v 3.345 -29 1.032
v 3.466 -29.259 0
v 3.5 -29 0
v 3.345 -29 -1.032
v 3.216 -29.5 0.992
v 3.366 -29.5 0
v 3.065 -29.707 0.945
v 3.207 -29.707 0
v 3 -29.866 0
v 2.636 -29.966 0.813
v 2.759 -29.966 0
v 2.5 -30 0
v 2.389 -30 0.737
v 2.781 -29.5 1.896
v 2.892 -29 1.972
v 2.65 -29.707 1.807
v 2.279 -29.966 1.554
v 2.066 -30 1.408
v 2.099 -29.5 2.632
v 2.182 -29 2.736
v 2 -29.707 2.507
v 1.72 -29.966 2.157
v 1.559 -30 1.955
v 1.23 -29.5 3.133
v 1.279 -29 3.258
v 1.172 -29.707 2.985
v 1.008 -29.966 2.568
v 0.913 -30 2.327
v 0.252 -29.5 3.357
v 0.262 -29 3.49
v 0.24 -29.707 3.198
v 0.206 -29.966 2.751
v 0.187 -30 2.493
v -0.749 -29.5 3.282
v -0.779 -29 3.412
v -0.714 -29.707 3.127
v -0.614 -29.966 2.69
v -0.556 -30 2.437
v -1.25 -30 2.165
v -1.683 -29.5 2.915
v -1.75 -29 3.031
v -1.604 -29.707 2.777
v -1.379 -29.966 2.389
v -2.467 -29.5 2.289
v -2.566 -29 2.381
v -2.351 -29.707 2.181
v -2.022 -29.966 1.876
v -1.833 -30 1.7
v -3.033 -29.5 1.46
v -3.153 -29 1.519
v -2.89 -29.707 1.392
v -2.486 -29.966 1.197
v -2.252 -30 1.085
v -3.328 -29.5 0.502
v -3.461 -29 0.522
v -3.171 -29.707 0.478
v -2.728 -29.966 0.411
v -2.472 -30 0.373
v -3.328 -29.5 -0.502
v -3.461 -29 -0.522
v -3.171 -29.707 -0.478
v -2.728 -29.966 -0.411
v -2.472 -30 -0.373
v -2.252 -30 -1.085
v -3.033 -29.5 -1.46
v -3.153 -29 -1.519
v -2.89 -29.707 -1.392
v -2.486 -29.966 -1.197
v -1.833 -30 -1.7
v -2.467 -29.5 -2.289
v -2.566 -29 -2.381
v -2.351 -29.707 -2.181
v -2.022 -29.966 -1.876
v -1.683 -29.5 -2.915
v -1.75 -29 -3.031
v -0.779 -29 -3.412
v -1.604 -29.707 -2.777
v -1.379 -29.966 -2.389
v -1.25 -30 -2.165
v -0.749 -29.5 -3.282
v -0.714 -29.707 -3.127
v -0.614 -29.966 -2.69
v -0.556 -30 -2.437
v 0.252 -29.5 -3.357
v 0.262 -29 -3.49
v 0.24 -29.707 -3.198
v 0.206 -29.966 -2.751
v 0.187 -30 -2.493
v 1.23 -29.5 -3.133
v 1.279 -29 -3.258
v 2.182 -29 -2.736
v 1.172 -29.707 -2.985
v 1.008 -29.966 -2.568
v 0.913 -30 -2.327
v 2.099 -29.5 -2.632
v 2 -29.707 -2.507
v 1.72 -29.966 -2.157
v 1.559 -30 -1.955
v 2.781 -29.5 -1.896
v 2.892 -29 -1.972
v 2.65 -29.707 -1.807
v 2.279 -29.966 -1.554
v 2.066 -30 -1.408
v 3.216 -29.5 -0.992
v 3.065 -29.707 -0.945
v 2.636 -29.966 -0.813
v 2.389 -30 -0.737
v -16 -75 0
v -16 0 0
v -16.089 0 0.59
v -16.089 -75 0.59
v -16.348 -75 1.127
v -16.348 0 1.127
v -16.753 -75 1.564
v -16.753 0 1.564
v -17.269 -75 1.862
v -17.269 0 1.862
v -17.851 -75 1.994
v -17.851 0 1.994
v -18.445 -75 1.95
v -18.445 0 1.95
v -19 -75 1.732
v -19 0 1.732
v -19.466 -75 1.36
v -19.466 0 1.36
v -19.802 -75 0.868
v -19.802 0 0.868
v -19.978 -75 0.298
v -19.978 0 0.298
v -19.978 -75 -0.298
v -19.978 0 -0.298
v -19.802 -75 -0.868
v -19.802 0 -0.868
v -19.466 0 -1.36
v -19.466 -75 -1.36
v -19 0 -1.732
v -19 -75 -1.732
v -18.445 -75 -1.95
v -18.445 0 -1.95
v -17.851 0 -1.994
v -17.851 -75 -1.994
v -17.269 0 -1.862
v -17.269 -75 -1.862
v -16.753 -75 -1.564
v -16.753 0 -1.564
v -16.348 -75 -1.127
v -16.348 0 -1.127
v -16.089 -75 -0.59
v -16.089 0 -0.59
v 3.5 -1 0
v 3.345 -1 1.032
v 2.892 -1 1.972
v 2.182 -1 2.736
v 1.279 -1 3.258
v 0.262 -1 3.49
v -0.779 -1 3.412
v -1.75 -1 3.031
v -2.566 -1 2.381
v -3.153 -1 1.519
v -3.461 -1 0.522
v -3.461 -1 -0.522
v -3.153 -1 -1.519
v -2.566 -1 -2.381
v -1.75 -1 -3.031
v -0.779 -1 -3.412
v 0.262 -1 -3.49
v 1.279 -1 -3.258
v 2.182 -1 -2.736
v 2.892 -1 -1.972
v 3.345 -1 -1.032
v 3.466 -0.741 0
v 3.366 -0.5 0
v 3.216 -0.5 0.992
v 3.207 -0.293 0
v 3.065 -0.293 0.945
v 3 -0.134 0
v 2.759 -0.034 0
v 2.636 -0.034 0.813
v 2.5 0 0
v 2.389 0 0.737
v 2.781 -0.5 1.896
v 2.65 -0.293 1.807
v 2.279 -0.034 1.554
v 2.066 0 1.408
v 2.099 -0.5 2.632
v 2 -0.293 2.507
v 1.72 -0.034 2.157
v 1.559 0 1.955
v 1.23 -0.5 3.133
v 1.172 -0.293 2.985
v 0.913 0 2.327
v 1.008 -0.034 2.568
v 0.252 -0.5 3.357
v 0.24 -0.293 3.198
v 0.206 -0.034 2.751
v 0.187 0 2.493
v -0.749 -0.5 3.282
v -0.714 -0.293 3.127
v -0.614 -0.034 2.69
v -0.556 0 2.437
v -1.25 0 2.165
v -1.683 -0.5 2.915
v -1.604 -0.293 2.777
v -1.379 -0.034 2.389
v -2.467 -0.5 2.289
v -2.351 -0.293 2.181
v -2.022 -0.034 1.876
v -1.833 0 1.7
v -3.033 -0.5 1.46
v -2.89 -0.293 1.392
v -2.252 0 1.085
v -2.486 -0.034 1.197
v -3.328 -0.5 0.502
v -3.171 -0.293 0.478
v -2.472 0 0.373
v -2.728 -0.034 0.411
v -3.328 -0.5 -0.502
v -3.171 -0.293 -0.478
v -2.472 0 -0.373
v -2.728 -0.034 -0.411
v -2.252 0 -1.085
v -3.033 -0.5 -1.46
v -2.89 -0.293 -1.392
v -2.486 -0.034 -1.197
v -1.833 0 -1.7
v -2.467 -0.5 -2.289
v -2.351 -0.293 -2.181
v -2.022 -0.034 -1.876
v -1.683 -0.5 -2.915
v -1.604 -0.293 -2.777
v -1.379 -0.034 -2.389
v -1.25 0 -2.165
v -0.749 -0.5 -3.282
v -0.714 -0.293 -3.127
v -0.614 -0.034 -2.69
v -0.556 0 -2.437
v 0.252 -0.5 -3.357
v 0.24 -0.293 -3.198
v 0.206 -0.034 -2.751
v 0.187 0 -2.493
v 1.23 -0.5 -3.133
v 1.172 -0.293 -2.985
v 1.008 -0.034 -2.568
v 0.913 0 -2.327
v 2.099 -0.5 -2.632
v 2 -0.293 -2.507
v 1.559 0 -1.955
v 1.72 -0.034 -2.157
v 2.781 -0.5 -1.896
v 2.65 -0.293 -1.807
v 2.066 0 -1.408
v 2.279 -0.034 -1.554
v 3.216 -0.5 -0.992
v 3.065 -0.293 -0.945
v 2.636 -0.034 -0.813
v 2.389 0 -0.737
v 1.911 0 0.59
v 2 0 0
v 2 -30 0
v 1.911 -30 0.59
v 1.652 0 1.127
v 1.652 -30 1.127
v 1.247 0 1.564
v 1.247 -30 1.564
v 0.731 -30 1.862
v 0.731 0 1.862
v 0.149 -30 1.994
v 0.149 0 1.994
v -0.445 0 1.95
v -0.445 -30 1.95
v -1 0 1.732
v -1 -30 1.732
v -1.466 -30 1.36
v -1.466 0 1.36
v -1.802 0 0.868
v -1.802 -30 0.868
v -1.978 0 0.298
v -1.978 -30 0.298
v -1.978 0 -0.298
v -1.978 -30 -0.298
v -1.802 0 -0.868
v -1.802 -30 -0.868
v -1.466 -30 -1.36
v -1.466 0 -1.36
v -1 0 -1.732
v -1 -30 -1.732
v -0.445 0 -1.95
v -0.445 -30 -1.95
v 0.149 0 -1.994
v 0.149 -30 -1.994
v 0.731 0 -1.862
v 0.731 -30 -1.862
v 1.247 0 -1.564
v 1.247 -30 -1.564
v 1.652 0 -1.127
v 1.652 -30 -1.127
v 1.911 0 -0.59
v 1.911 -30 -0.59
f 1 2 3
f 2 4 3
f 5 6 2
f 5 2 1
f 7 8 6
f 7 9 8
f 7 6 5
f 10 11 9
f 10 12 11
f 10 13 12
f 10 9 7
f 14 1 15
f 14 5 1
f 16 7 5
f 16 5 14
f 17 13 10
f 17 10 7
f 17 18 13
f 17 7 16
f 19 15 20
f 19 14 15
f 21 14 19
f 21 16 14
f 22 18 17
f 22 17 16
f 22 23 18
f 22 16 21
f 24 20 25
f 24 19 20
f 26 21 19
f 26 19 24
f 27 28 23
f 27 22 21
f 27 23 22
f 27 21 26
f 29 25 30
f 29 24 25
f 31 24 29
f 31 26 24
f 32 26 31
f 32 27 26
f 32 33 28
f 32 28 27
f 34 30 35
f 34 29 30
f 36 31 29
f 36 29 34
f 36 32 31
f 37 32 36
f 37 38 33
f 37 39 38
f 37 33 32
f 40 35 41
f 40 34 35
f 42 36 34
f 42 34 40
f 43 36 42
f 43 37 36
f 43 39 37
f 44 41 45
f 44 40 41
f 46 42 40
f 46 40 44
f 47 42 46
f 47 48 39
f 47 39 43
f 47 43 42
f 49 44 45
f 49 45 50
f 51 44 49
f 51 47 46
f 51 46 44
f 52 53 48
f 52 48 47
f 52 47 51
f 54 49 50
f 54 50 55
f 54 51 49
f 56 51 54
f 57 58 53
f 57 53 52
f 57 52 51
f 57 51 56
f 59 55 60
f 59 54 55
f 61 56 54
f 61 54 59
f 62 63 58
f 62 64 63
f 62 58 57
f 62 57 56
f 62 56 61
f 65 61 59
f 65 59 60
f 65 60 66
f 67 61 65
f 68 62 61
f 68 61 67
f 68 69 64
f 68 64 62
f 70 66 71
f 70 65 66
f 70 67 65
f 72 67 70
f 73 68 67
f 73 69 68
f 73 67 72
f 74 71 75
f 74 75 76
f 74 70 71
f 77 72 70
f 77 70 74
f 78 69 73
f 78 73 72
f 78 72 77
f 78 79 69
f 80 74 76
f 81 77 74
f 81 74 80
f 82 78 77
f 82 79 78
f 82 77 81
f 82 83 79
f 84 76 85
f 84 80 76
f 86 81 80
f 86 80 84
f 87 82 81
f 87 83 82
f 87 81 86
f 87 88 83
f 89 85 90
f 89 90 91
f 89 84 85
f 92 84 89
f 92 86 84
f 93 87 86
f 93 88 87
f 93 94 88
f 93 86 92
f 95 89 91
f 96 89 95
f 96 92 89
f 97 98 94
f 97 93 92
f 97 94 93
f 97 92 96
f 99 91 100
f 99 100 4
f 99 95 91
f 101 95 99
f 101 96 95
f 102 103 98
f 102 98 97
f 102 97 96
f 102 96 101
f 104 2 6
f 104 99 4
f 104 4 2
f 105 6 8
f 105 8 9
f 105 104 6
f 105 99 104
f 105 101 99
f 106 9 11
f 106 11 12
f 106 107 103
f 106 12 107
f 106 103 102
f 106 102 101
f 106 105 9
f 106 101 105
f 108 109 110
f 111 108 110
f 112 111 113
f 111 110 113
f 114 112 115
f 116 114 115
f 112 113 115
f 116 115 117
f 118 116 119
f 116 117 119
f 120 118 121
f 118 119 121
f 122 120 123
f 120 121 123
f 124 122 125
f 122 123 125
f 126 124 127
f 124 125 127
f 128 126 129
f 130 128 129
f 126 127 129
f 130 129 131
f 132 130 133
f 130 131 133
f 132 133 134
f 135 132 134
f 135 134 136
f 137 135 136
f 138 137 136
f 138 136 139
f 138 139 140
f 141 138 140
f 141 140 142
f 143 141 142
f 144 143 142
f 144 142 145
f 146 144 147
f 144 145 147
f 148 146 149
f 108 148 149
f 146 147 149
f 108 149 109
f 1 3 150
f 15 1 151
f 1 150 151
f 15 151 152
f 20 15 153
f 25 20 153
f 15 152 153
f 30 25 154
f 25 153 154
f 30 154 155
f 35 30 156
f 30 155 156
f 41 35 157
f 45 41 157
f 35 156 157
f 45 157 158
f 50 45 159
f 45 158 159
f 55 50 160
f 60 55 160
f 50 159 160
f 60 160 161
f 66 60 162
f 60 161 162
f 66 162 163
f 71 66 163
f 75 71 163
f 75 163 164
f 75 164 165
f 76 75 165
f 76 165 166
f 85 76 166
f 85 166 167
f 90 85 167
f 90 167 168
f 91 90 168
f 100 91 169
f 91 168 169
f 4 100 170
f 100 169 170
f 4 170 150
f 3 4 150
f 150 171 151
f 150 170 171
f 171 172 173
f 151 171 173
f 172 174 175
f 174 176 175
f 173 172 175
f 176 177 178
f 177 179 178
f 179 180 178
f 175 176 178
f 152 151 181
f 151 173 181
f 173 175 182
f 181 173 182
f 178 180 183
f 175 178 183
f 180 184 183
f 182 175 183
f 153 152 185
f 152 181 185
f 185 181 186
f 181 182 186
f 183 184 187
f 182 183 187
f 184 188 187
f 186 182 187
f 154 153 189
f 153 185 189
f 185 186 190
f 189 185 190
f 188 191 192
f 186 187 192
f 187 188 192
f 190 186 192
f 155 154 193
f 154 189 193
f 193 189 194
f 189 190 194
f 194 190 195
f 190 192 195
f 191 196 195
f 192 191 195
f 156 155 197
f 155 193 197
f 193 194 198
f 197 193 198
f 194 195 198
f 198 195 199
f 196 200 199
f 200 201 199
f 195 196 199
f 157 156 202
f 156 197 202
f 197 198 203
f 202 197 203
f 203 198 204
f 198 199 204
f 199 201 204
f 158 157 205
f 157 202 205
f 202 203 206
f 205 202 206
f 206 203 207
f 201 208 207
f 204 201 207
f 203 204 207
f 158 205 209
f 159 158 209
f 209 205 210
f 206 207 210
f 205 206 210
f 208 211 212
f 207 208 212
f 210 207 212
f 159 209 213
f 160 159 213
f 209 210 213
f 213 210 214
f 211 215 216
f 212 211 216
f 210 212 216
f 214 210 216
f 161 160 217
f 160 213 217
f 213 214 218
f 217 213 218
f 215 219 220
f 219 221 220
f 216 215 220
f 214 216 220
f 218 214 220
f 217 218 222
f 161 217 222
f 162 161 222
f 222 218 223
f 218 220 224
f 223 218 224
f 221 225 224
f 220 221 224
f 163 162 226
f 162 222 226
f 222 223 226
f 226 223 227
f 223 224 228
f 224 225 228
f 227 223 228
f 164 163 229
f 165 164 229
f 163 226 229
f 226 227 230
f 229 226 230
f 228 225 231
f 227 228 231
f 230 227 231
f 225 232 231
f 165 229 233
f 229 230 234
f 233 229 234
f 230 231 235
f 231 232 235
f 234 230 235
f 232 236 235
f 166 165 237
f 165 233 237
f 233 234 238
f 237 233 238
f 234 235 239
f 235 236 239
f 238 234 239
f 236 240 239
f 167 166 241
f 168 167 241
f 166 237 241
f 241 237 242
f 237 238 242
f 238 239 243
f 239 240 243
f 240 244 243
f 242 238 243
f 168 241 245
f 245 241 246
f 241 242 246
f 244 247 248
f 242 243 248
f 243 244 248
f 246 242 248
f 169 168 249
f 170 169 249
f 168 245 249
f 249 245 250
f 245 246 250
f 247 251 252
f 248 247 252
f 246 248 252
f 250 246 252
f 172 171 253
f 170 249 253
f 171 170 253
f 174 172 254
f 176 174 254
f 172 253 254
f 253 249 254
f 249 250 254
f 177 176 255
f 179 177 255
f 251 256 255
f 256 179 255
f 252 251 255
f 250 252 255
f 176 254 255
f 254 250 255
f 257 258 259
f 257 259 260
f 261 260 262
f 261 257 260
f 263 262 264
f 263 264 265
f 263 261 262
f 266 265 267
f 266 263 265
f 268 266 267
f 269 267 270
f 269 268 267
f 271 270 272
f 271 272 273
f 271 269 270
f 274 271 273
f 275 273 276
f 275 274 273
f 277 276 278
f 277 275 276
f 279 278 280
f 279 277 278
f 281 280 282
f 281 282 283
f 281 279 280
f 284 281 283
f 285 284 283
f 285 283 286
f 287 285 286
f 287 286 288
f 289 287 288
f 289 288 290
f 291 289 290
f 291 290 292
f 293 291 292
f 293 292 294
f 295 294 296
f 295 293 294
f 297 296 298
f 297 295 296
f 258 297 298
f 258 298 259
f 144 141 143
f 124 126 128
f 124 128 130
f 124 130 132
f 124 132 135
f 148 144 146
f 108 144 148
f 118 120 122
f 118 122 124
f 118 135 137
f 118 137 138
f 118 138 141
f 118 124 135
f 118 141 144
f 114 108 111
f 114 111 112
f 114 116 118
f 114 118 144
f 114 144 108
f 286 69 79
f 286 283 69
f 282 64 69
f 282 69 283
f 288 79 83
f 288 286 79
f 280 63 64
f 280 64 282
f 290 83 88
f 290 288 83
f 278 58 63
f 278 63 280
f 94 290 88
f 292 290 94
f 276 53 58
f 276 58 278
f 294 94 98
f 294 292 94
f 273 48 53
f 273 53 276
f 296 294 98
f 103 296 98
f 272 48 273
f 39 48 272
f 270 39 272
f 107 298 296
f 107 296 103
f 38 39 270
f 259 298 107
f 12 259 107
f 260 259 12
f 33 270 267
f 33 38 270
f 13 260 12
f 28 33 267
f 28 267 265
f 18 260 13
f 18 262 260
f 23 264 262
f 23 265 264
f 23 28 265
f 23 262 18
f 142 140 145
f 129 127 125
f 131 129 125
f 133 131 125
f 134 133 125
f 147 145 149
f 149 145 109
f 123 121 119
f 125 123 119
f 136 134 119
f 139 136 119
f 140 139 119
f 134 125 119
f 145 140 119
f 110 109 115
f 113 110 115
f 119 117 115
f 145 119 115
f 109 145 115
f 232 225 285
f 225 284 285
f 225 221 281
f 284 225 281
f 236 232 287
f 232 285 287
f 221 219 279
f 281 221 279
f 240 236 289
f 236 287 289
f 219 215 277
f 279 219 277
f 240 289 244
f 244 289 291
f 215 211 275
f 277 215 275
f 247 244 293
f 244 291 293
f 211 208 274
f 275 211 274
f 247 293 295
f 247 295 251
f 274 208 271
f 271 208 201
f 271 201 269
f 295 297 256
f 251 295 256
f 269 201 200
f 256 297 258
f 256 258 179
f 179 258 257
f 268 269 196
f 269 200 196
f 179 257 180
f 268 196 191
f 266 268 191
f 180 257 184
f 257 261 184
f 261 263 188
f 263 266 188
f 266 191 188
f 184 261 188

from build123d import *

# Parameters (mm, degrees)
F0_R     = 3.5
F0_R_2   = 2
F1_DEPTH = 30
F2_R     = 1
F3_DEPTH = 75


with BuildPart() as f1:
    # F0 (on Front) → F1 (new body)
    with BuildSketch(Plane.XZ):
        Circle(F0_R)
        Circle(F0_R_2, mode=Mode.SUBTRACT)
    extrude(amount=F1_DEPTH)

    # F2
    f2_edges = [f1.edges().sort_by_distance(p)[0] for p in [
        (-3.5, -30, 0),
        (-3.5, 0, 0),
    ]]
    fillet(f2_edges, radius=F2_R)


with BuildPart() as f3:
    # F0 (on Front) → F3 (new body)
    with BuildSketch(Plane.XZ):
        with Locations((-18, 0)):
            Circle(F0_R_2)
    extrude(amount=F3_DEPTH)


solid = Compound([f1.part, f3.part])
